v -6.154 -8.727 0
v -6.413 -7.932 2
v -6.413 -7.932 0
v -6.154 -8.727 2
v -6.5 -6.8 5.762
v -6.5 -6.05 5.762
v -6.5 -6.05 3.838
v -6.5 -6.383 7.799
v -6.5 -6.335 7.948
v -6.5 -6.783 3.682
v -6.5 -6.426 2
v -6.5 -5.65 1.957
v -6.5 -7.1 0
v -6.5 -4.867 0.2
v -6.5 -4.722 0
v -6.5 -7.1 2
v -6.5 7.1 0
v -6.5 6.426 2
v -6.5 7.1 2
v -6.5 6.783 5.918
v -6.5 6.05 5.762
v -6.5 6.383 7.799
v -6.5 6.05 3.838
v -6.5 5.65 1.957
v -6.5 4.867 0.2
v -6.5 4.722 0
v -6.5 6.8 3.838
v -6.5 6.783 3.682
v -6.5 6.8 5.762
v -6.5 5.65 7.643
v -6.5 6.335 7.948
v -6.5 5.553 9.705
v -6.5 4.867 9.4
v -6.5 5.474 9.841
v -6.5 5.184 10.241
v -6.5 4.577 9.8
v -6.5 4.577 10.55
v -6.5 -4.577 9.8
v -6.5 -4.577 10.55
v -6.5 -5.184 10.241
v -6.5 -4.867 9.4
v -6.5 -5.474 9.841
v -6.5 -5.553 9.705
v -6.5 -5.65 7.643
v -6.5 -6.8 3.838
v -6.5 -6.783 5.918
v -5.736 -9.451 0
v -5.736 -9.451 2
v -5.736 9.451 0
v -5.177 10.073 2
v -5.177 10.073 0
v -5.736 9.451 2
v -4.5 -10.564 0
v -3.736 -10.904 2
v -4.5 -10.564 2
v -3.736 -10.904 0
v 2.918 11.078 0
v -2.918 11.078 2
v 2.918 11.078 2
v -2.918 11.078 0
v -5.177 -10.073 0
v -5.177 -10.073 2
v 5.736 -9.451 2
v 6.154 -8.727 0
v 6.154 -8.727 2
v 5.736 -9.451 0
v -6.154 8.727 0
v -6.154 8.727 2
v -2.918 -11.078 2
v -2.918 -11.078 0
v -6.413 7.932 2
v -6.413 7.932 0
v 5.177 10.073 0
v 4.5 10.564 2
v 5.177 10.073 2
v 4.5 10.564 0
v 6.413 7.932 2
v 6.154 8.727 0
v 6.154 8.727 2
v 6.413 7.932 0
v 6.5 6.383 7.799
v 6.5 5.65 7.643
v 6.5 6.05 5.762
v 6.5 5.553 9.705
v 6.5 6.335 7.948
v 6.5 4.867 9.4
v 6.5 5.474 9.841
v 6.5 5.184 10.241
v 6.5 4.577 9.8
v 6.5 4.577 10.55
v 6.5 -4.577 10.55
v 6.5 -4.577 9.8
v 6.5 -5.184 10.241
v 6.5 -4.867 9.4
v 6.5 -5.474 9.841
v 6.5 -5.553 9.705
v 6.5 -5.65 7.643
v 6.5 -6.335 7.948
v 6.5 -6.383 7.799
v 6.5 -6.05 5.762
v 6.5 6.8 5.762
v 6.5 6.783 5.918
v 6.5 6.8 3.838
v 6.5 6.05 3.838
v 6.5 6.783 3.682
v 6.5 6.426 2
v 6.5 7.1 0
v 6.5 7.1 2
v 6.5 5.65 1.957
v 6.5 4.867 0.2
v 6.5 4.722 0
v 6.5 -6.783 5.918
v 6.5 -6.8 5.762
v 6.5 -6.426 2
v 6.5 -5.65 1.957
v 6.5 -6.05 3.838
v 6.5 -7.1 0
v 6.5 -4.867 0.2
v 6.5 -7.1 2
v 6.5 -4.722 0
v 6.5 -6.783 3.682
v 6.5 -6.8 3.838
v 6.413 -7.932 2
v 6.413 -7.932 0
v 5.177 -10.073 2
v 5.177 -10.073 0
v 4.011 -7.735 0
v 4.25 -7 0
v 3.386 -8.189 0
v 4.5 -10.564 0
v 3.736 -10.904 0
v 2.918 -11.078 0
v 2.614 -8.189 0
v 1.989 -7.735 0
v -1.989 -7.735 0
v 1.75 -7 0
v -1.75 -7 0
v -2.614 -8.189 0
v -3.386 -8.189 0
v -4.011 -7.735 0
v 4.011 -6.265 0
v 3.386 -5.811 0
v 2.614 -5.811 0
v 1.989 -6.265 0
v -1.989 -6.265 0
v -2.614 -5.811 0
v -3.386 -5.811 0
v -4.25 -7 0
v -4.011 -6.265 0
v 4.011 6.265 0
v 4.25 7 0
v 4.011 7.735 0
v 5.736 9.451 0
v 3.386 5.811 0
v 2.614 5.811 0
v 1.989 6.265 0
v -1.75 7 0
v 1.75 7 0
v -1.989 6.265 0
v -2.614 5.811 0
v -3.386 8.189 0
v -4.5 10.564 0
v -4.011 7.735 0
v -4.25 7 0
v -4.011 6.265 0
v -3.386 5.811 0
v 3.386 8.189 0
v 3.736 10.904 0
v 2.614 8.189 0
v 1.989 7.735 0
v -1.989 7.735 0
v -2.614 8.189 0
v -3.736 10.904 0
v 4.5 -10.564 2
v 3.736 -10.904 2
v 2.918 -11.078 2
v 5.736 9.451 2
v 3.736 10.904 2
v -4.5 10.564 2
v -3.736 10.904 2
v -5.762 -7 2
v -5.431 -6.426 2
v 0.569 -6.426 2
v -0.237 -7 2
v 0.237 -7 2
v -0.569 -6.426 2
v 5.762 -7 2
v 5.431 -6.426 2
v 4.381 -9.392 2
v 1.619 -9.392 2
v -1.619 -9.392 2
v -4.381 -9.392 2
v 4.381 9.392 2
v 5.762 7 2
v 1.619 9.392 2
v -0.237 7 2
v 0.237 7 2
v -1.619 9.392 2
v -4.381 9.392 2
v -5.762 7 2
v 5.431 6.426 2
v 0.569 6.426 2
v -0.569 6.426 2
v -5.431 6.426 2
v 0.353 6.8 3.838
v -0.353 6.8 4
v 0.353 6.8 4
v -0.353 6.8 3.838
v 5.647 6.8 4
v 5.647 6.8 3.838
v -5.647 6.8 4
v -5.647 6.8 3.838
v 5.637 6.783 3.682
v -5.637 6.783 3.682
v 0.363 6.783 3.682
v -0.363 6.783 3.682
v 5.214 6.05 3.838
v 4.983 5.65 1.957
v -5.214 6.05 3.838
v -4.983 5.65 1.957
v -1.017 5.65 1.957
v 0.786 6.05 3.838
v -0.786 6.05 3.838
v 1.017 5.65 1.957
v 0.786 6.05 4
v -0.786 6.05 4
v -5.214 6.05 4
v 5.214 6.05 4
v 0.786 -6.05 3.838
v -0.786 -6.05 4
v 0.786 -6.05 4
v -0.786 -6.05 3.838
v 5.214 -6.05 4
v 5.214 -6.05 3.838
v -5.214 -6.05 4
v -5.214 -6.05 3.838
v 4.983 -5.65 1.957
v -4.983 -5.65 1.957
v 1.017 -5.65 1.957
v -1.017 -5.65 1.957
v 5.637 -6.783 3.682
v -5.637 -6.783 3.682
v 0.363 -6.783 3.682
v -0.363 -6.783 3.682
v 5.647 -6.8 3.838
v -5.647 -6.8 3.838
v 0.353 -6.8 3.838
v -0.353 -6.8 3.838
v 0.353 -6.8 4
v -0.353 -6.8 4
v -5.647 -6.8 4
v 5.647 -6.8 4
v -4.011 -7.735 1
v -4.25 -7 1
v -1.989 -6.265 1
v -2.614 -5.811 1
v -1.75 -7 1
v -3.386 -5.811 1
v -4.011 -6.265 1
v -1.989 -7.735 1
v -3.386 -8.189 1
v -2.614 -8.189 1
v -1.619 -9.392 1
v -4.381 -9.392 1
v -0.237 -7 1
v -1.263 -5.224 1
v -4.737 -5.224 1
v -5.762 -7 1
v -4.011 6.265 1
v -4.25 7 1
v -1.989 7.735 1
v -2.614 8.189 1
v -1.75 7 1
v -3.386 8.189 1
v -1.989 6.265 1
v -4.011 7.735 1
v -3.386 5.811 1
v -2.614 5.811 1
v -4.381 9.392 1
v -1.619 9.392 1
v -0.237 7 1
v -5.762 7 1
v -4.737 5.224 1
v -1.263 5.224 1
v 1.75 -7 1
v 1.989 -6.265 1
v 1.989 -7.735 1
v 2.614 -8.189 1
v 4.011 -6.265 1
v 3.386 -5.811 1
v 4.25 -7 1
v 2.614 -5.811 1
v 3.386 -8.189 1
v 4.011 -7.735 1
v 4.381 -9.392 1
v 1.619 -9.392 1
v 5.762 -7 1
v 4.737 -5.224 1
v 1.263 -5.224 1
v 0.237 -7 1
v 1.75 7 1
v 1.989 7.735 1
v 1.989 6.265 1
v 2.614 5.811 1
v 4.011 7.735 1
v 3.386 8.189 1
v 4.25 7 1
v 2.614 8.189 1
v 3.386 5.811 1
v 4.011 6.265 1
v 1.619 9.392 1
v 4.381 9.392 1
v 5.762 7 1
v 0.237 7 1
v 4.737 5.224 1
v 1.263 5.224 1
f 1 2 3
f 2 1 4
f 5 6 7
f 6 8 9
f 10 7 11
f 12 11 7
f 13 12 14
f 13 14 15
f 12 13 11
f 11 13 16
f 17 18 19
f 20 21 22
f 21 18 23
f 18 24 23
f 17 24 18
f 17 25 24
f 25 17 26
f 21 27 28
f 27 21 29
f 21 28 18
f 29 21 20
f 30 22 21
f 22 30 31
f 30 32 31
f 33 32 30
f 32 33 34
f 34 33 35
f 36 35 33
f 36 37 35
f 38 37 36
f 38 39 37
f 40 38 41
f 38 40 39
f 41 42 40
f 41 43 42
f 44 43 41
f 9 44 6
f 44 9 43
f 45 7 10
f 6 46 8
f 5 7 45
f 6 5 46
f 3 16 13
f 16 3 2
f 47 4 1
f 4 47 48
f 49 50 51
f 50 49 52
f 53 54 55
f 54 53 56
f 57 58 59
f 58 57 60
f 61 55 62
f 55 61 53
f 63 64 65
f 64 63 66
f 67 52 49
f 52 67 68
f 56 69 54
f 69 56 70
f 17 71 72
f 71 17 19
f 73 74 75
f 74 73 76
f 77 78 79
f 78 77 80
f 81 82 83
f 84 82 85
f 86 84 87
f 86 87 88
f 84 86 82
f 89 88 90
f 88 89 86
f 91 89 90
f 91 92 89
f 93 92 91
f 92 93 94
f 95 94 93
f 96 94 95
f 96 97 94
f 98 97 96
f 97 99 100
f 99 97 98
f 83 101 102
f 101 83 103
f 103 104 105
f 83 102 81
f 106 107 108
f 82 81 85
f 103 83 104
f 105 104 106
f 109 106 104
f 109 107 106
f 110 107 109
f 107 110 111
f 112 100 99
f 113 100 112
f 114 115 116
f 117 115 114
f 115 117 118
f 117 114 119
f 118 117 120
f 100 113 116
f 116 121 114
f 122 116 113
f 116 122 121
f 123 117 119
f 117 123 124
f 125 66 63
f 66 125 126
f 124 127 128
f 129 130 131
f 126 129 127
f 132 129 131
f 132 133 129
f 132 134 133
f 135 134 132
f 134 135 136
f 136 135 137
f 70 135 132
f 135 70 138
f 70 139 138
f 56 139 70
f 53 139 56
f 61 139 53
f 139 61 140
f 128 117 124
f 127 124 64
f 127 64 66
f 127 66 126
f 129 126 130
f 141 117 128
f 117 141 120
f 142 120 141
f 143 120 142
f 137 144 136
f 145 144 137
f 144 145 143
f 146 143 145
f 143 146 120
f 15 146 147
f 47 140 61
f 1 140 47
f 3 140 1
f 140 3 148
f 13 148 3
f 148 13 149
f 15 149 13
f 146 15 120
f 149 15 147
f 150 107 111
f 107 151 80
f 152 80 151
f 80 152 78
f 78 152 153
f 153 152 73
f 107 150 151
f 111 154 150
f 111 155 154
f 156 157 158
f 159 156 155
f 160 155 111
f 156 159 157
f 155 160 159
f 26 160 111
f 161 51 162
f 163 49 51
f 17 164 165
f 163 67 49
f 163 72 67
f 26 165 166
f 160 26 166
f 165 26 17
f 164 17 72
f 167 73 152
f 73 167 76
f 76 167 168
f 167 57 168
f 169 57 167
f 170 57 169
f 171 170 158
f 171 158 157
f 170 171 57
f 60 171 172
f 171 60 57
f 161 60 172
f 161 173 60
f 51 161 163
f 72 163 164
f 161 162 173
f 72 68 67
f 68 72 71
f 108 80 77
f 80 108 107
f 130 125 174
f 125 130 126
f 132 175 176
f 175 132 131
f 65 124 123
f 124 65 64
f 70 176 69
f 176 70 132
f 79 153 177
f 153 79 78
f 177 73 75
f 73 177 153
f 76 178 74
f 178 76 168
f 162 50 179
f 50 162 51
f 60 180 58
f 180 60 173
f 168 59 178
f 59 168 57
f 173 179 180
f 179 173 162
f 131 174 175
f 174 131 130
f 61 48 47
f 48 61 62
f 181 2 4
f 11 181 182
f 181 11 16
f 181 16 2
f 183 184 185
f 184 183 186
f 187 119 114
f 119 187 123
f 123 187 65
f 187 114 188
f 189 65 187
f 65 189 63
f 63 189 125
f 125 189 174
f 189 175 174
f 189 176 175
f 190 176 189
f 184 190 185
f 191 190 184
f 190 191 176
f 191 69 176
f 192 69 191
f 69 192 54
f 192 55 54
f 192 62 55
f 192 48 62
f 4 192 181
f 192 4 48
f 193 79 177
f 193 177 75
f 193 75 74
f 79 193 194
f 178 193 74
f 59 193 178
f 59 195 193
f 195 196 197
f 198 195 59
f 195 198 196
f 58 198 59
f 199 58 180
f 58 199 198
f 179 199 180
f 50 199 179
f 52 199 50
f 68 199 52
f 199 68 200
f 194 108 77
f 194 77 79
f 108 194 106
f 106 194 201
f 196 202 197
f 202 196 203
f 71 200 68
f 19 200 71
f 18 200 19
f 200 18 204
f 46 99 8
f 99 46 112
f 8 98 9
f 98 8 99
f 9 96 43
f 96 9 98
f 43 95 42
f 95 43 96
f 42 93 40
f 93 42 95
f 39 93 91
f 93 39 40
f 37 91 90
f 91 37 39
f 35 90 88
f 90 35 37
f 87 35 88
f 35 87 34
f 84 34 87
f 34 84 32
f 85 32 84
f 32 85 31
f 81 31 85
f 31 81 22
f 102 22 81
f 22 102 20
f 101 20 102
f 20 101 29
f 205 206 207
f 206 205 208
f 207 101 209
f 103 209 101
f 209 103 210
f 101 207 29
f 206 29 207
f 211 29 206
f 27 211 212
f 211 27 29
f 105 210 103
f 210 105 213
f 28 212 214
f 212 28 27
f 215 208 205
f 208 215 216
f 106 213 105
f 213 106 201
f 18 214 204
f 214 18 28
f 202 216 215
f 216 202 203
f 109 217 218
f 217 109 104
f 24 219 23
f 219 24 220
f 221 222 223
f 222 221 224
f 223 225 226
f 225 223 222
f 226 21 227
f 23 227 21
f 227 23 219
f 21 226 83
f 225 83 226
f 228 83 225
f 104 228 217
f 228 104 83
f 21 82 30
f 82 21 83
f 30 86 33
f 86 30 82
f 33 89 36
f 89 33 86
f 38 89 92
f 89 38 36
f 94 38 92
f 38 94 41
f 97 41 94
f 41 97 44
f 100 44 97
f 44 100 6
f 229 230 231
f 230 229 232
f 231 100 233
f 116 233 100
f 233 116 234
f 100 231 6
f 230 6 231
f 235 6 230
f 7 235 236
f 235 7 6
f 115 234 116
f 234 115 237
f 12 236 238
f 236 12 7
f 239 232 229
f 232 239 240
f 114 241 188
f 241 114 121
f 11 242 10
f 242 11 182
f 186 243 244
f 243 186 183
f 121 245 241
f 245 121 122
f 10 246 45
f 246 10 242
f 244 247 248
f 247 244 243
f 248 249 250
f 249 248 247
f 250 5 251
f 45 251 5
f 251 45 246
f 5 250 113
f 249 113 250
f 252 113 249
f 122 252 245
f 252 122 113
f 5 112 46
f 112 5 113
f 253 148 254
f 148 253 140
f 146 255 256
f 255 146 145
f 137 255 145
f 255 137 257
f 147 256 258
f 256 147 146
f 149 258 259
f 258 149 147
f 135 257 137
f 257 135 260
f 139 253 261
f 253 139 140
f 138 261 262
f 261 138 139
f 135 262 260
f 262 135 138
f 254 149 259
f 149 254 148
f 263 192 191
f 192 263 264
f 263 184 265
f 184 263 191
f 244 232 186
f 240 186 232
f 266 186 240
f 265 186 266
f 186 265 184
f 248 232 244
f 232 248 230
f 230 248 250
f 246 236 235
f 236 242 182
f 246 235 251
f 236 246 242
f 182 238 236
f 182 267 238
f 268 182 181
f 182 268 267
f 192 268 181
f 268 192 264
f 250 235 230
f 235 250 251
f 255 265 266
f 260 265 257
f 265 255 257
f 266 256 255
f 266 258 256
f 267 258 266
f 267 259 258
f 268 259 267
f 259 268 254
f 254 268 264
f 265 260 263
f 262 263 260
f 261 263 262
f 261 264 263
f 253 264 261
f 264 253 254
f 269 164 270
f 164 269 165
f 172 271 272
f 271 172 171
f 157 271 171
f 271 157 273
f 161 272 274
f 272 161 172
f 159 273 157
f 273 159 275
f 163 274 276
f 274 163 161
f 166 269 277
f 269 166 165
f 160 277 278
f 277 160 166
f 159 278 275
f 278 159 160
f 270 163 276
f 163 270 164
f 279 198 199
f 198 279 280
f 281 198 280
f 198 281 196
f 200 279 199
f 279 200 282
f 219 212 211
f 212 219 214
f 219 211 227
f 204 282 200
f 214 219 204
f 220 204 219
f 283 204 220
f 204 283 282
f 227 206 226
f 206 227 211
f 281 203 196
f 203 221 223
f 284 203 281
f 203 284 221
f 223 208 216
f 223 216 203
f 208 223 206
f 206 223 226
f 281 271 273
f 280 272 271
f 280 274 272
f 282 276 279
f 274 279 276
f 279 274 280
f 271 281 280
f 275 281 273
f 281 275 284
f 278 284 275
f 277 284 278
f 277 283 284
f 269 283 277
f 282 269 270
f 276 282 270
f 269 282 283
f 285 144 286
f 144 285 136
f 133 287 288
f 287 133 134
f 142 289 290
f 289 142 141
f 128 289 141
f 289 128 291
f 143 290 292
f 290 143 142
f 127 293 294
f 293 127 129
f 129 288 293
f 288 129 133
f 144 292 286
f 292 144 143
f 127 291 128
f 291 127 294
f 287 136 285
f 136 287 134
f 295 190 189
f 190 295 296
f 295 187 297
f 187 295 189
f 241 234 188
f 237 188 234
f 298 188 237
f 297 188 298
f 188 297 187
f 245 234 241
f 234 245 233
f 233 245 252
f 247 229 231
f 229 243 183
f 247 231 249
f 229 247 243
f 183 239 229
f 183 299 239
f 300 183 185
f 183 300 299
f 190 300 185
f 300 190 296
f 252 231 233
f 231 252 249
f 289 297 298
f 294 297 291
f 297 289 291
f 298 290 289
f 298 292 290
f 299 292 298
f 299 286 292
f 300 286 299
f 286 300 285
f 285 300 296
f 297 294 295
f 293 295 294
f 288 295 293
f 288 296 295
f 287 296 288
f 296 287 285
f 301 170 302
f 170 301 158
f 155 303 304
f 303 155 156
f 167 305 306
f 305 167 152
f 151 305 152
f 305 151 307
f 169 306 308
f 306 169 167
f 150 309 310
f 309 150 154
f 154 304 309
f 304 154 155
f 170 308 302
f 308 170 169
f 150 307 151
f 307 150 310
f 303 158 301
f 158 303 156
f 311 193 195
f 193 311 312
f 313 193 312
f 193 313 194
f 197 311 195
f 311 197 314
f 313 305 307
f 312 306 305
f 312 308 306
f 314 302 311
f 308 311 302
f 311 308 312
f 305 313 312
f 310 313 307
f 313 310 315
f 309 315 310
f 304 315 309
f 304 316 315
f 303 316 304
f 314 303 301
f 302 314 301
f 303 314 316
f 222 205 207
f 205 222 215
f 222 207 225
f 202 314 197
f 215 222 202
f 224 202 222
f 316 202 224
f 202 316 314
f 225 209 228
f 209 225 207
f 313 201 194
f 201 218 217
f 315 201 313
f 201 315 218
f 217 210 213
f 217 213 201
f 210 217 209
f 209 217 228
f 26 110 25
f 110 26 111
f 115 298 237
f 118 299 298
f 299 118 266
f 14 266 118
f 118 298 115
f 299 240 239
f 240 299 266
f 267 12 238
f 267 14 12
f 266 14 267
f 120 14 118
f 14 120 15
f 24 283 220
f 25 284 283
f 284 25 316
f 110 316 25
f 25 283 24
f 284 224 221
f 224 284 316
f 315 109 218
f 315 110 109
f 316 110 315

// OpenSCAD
// file: motor_mount_correct.scad
// This document uses MILLIMETRES as a unit.

use <inc/bevel_lib.scad>;

// Set $fs (smallest arc fragment) to lower value than default 2.0
$fs = 0.8; // millimetres

// Use the correct orientation, we can rotate it in the slicer.
// This is designed to be printed sideways (y axis=up), so that the filament will be
// in the best direction

base_height_main = 0.0; // Set this with -D

motor_width_margin = 0.2;
motor_width = 12 + motor_width_margin;
motor_height = 10;
overall_height = motor_height + 1.0; // Needs to be bigger than the motor!
motor_length = 13;
motor_length_half = motor_length / 2;
motor_width_half = motor_width / 2;
motor_height_half = motor_height / 2;
side_overlap = 4.0;
cutout_r = 2.125;

hole_distance_y = 14;
hole_distance_x = 6;

module outline() {
    intersection() {
        square([motor_height, motor_width], center=true);
        rad1 = motor_width - 3;
        translate([0, - motor_width_half + rad1]) 
            circle(r=rad1);
        translate([0, motor_width_half - rad1]) 
            circle(r=rad1);
    }
}


module mount_holes(cutout_depth, base_height)
{
    // These holes should be along the z axis.
    translate([0,0, -1]) {
        for (x = [-0.5 * hole_distance_x, 0.5 * hole_distance_x] ) {
            for (y = [-0.5 * hole_distance_y, 0.5 * hole_distance_y]) {
                translate([x,y,0])
                    cylinder(r=1.25, h=overall_height + 1.0 + base_height + 0.1 - cutout_depth);
                echo("cutout_depth=", cutout_depth);
                if (cutout_depth > 0.01) {
                    $fn = 6; // Hex cutout
                    // Because it is a hex, we actually need to increase
                    // r, otherwise it's too small.
                    cutout_calculated_r = cutout_r * 1.3;
                    // Hex cutouts - rotate 30 degrees? to give a better
                    // orientation.
                    translate([x,y,overall_height + 1.0 + base_height - cutout_depth])
                        rotate([0,0,0])
                            cylinder(r=cutout_calculated_r, h = 3.0);
                }
            }
        }     
    }
    if (base_height > 2.0) {
        wiring_w = 5.0;
        wiring_h = 1.5;
        // Cutout underneath for wiring... 
        // in x direction
        translate([-20, -(wiring_w / 2), - wiring_h])
            bevelledbox_x([40, wiring_w, wiring_h*2], radius=wiring_h); 
    }
}

module mount_outside(base_height)
{
    r1 = 4.0; // radius of corner
    border = 5.0;
    
    /* This is what we really want ... */
    mx = motor_length_half  - r1;
    my = motor_width_half + border - r1;
    linear_extrude(height=overall_height + base_height) {
        hull() {
            translate([mx, my]) circle(r1);
            translate([-mx, my]) circle(r1);
            translate([mx, -my]) circle(r1);
            translate([-mx, -my]) circle(r1);
        }
    }
}


module motor_cutout(base_height)
{
    // Cut out for motor
    translate([0,0,base_height]) 
        rotate([0,-90,0])
            translate([motor_height_half - 0.2, 0,0 ]) {
                linear_extrude(height=motor_length + 12.0, center=true) {
                    outline();
                }
            }
}

module motor_mount_main(cutout_depth = 0.0, base_height=0.0) {
    difference()
    {
        mount_outside(base_height);
        union()
        {
            motor_cutout(base_height);
            mount_holes(cutout_depth, base_height);
        }
    }
}

motor_mount_main(base_height = base_height_main);
// file: inc/bevel_lib.scad
// Bevelled boxes, etc
module roundedbox(size=[1.0, 1.0, 1.0, ], radius = 0.1) {
    hull() {
        for (x = [radius, size[0] - radius]) {
            for (y = [radius, size[1] - radius]) {
                for (z = [radius, size[2] - radius]) {
                    translate([x,y,z])
                        sphere(r=radius);
                }
            }
        }
    }
}

module rounded_square_centered(size=[1,1], radius=0.1) {
    hull() {
        for (x = [- size[0] / 2 + radius, size[0] / 2 - radius]) {
            for (y = [- size[1] / 2 + radius, size[1] / 2 - radius]) {
                translate([x,y]) circle(radius);
            }
        }
    }
}

// Bevelled in x and y axes.
module bevelledbox(size=[1,1,1], radius=0.1) {
    linear_extrude(height=size[2]) {
        // 8-sided polygon
        polygon(points=[
            // Left
            [0, radius ],
            [0, size[1] - radius ],
            // Top
            [radius, size[1]],
            [size[0] - radius, size[1]],
            // Right
            [size[0], size[1] - radius],
            [size[0], radius],
            // Bot
            [size[0] -radius, 0],
            [radius, 0]
            ]);
    }
}

module bevelledbox_y(size=[1,1,1], radius=0.1) {
    // Bevelled around y
    translate([0,0,size[2]])
        rotate(-90, [1,0,0])
            bevelledbox([size[0], size[2], size[1]], radius); 
}

module bevelledbox_x(size=[1,1,1], radius=0.1) {
    // Bevelled around x
    translate([size[0],0,0])
        rotate(-90, [0,1,0])
            bevelledbox([size[2], size[1], size[0]], radius); 
}

// Draw origin-centred, unit polyhedron.
module octahedron(C0=1.0) {
    polyhedron(points = [
        [0.0, 0.0,  C0],
        [0.0, 0.0, -C0],
        [ C0, 0.0, 0.0],
        [-C0, 0.0, 0.0],
        [0.0,  C0, 0.0],
        [0.0, -C0, 0.0]
        ],
        faces = [
[ 4 , 2, 0],
[ 3 , 4, 0],
[ 5 , 3, 0],
[ 2 , 5, 0],
[ 5 , 2, 1],
[ 3 , 5, 1],
[ 4 , 3, 1],
[ 2 , 4, 1]
        ]
    );
}

module fullybevelledbox(size=[1,1,1], radius=0.1) {
    hull() {
        for (x = [radius, size[0] - radius]) {
            for (y = [radius, size[1] - radius]) {
                for (z = [radius, size[2] - radius]) {
                    translate([x,y,z])
                        octahedron(radius);
                }
            }
        }
    }
}
// main file
// This document uses MILLIMETRES as a unit.

use <inc/bevel_lib.scad>;
use <motor_mount_correct.scad>;

// Set $fs (smallest arc fragment) to lower value than default 2.0
$fs = 0.8; // millimetres

mount_depth = 3.0;
cutout_depth = 13-mount_depth;

motor_length = 13;
motor_height_half = 5;

module motor_holder()
{
    rotate([0,-90,0])
        translate([motor_height_half - 0.2, 0,0 ]) {
            linear_extrude(height=13, convexity=3, center=true) {
                difference() {
                    offset(0.75) outline();
                    outline();
                    translate([-2 - (motor_height_half) + 0.2,0]) square([4,20], center=true);
                }
            }
        }
}

module base_part()
{
       intersection() {
            mount_outside(0.0); // base_height
            cube([30,30,4], center=true);
        }

}

module main()
{
    difference()
    {
        union() {
            base_part();
            motor_holder();
        }
        union()
        {
            motor_cutout(0.0);
            mount_holes(cutout_depth, 0.0);
        }
    }
}

main();
